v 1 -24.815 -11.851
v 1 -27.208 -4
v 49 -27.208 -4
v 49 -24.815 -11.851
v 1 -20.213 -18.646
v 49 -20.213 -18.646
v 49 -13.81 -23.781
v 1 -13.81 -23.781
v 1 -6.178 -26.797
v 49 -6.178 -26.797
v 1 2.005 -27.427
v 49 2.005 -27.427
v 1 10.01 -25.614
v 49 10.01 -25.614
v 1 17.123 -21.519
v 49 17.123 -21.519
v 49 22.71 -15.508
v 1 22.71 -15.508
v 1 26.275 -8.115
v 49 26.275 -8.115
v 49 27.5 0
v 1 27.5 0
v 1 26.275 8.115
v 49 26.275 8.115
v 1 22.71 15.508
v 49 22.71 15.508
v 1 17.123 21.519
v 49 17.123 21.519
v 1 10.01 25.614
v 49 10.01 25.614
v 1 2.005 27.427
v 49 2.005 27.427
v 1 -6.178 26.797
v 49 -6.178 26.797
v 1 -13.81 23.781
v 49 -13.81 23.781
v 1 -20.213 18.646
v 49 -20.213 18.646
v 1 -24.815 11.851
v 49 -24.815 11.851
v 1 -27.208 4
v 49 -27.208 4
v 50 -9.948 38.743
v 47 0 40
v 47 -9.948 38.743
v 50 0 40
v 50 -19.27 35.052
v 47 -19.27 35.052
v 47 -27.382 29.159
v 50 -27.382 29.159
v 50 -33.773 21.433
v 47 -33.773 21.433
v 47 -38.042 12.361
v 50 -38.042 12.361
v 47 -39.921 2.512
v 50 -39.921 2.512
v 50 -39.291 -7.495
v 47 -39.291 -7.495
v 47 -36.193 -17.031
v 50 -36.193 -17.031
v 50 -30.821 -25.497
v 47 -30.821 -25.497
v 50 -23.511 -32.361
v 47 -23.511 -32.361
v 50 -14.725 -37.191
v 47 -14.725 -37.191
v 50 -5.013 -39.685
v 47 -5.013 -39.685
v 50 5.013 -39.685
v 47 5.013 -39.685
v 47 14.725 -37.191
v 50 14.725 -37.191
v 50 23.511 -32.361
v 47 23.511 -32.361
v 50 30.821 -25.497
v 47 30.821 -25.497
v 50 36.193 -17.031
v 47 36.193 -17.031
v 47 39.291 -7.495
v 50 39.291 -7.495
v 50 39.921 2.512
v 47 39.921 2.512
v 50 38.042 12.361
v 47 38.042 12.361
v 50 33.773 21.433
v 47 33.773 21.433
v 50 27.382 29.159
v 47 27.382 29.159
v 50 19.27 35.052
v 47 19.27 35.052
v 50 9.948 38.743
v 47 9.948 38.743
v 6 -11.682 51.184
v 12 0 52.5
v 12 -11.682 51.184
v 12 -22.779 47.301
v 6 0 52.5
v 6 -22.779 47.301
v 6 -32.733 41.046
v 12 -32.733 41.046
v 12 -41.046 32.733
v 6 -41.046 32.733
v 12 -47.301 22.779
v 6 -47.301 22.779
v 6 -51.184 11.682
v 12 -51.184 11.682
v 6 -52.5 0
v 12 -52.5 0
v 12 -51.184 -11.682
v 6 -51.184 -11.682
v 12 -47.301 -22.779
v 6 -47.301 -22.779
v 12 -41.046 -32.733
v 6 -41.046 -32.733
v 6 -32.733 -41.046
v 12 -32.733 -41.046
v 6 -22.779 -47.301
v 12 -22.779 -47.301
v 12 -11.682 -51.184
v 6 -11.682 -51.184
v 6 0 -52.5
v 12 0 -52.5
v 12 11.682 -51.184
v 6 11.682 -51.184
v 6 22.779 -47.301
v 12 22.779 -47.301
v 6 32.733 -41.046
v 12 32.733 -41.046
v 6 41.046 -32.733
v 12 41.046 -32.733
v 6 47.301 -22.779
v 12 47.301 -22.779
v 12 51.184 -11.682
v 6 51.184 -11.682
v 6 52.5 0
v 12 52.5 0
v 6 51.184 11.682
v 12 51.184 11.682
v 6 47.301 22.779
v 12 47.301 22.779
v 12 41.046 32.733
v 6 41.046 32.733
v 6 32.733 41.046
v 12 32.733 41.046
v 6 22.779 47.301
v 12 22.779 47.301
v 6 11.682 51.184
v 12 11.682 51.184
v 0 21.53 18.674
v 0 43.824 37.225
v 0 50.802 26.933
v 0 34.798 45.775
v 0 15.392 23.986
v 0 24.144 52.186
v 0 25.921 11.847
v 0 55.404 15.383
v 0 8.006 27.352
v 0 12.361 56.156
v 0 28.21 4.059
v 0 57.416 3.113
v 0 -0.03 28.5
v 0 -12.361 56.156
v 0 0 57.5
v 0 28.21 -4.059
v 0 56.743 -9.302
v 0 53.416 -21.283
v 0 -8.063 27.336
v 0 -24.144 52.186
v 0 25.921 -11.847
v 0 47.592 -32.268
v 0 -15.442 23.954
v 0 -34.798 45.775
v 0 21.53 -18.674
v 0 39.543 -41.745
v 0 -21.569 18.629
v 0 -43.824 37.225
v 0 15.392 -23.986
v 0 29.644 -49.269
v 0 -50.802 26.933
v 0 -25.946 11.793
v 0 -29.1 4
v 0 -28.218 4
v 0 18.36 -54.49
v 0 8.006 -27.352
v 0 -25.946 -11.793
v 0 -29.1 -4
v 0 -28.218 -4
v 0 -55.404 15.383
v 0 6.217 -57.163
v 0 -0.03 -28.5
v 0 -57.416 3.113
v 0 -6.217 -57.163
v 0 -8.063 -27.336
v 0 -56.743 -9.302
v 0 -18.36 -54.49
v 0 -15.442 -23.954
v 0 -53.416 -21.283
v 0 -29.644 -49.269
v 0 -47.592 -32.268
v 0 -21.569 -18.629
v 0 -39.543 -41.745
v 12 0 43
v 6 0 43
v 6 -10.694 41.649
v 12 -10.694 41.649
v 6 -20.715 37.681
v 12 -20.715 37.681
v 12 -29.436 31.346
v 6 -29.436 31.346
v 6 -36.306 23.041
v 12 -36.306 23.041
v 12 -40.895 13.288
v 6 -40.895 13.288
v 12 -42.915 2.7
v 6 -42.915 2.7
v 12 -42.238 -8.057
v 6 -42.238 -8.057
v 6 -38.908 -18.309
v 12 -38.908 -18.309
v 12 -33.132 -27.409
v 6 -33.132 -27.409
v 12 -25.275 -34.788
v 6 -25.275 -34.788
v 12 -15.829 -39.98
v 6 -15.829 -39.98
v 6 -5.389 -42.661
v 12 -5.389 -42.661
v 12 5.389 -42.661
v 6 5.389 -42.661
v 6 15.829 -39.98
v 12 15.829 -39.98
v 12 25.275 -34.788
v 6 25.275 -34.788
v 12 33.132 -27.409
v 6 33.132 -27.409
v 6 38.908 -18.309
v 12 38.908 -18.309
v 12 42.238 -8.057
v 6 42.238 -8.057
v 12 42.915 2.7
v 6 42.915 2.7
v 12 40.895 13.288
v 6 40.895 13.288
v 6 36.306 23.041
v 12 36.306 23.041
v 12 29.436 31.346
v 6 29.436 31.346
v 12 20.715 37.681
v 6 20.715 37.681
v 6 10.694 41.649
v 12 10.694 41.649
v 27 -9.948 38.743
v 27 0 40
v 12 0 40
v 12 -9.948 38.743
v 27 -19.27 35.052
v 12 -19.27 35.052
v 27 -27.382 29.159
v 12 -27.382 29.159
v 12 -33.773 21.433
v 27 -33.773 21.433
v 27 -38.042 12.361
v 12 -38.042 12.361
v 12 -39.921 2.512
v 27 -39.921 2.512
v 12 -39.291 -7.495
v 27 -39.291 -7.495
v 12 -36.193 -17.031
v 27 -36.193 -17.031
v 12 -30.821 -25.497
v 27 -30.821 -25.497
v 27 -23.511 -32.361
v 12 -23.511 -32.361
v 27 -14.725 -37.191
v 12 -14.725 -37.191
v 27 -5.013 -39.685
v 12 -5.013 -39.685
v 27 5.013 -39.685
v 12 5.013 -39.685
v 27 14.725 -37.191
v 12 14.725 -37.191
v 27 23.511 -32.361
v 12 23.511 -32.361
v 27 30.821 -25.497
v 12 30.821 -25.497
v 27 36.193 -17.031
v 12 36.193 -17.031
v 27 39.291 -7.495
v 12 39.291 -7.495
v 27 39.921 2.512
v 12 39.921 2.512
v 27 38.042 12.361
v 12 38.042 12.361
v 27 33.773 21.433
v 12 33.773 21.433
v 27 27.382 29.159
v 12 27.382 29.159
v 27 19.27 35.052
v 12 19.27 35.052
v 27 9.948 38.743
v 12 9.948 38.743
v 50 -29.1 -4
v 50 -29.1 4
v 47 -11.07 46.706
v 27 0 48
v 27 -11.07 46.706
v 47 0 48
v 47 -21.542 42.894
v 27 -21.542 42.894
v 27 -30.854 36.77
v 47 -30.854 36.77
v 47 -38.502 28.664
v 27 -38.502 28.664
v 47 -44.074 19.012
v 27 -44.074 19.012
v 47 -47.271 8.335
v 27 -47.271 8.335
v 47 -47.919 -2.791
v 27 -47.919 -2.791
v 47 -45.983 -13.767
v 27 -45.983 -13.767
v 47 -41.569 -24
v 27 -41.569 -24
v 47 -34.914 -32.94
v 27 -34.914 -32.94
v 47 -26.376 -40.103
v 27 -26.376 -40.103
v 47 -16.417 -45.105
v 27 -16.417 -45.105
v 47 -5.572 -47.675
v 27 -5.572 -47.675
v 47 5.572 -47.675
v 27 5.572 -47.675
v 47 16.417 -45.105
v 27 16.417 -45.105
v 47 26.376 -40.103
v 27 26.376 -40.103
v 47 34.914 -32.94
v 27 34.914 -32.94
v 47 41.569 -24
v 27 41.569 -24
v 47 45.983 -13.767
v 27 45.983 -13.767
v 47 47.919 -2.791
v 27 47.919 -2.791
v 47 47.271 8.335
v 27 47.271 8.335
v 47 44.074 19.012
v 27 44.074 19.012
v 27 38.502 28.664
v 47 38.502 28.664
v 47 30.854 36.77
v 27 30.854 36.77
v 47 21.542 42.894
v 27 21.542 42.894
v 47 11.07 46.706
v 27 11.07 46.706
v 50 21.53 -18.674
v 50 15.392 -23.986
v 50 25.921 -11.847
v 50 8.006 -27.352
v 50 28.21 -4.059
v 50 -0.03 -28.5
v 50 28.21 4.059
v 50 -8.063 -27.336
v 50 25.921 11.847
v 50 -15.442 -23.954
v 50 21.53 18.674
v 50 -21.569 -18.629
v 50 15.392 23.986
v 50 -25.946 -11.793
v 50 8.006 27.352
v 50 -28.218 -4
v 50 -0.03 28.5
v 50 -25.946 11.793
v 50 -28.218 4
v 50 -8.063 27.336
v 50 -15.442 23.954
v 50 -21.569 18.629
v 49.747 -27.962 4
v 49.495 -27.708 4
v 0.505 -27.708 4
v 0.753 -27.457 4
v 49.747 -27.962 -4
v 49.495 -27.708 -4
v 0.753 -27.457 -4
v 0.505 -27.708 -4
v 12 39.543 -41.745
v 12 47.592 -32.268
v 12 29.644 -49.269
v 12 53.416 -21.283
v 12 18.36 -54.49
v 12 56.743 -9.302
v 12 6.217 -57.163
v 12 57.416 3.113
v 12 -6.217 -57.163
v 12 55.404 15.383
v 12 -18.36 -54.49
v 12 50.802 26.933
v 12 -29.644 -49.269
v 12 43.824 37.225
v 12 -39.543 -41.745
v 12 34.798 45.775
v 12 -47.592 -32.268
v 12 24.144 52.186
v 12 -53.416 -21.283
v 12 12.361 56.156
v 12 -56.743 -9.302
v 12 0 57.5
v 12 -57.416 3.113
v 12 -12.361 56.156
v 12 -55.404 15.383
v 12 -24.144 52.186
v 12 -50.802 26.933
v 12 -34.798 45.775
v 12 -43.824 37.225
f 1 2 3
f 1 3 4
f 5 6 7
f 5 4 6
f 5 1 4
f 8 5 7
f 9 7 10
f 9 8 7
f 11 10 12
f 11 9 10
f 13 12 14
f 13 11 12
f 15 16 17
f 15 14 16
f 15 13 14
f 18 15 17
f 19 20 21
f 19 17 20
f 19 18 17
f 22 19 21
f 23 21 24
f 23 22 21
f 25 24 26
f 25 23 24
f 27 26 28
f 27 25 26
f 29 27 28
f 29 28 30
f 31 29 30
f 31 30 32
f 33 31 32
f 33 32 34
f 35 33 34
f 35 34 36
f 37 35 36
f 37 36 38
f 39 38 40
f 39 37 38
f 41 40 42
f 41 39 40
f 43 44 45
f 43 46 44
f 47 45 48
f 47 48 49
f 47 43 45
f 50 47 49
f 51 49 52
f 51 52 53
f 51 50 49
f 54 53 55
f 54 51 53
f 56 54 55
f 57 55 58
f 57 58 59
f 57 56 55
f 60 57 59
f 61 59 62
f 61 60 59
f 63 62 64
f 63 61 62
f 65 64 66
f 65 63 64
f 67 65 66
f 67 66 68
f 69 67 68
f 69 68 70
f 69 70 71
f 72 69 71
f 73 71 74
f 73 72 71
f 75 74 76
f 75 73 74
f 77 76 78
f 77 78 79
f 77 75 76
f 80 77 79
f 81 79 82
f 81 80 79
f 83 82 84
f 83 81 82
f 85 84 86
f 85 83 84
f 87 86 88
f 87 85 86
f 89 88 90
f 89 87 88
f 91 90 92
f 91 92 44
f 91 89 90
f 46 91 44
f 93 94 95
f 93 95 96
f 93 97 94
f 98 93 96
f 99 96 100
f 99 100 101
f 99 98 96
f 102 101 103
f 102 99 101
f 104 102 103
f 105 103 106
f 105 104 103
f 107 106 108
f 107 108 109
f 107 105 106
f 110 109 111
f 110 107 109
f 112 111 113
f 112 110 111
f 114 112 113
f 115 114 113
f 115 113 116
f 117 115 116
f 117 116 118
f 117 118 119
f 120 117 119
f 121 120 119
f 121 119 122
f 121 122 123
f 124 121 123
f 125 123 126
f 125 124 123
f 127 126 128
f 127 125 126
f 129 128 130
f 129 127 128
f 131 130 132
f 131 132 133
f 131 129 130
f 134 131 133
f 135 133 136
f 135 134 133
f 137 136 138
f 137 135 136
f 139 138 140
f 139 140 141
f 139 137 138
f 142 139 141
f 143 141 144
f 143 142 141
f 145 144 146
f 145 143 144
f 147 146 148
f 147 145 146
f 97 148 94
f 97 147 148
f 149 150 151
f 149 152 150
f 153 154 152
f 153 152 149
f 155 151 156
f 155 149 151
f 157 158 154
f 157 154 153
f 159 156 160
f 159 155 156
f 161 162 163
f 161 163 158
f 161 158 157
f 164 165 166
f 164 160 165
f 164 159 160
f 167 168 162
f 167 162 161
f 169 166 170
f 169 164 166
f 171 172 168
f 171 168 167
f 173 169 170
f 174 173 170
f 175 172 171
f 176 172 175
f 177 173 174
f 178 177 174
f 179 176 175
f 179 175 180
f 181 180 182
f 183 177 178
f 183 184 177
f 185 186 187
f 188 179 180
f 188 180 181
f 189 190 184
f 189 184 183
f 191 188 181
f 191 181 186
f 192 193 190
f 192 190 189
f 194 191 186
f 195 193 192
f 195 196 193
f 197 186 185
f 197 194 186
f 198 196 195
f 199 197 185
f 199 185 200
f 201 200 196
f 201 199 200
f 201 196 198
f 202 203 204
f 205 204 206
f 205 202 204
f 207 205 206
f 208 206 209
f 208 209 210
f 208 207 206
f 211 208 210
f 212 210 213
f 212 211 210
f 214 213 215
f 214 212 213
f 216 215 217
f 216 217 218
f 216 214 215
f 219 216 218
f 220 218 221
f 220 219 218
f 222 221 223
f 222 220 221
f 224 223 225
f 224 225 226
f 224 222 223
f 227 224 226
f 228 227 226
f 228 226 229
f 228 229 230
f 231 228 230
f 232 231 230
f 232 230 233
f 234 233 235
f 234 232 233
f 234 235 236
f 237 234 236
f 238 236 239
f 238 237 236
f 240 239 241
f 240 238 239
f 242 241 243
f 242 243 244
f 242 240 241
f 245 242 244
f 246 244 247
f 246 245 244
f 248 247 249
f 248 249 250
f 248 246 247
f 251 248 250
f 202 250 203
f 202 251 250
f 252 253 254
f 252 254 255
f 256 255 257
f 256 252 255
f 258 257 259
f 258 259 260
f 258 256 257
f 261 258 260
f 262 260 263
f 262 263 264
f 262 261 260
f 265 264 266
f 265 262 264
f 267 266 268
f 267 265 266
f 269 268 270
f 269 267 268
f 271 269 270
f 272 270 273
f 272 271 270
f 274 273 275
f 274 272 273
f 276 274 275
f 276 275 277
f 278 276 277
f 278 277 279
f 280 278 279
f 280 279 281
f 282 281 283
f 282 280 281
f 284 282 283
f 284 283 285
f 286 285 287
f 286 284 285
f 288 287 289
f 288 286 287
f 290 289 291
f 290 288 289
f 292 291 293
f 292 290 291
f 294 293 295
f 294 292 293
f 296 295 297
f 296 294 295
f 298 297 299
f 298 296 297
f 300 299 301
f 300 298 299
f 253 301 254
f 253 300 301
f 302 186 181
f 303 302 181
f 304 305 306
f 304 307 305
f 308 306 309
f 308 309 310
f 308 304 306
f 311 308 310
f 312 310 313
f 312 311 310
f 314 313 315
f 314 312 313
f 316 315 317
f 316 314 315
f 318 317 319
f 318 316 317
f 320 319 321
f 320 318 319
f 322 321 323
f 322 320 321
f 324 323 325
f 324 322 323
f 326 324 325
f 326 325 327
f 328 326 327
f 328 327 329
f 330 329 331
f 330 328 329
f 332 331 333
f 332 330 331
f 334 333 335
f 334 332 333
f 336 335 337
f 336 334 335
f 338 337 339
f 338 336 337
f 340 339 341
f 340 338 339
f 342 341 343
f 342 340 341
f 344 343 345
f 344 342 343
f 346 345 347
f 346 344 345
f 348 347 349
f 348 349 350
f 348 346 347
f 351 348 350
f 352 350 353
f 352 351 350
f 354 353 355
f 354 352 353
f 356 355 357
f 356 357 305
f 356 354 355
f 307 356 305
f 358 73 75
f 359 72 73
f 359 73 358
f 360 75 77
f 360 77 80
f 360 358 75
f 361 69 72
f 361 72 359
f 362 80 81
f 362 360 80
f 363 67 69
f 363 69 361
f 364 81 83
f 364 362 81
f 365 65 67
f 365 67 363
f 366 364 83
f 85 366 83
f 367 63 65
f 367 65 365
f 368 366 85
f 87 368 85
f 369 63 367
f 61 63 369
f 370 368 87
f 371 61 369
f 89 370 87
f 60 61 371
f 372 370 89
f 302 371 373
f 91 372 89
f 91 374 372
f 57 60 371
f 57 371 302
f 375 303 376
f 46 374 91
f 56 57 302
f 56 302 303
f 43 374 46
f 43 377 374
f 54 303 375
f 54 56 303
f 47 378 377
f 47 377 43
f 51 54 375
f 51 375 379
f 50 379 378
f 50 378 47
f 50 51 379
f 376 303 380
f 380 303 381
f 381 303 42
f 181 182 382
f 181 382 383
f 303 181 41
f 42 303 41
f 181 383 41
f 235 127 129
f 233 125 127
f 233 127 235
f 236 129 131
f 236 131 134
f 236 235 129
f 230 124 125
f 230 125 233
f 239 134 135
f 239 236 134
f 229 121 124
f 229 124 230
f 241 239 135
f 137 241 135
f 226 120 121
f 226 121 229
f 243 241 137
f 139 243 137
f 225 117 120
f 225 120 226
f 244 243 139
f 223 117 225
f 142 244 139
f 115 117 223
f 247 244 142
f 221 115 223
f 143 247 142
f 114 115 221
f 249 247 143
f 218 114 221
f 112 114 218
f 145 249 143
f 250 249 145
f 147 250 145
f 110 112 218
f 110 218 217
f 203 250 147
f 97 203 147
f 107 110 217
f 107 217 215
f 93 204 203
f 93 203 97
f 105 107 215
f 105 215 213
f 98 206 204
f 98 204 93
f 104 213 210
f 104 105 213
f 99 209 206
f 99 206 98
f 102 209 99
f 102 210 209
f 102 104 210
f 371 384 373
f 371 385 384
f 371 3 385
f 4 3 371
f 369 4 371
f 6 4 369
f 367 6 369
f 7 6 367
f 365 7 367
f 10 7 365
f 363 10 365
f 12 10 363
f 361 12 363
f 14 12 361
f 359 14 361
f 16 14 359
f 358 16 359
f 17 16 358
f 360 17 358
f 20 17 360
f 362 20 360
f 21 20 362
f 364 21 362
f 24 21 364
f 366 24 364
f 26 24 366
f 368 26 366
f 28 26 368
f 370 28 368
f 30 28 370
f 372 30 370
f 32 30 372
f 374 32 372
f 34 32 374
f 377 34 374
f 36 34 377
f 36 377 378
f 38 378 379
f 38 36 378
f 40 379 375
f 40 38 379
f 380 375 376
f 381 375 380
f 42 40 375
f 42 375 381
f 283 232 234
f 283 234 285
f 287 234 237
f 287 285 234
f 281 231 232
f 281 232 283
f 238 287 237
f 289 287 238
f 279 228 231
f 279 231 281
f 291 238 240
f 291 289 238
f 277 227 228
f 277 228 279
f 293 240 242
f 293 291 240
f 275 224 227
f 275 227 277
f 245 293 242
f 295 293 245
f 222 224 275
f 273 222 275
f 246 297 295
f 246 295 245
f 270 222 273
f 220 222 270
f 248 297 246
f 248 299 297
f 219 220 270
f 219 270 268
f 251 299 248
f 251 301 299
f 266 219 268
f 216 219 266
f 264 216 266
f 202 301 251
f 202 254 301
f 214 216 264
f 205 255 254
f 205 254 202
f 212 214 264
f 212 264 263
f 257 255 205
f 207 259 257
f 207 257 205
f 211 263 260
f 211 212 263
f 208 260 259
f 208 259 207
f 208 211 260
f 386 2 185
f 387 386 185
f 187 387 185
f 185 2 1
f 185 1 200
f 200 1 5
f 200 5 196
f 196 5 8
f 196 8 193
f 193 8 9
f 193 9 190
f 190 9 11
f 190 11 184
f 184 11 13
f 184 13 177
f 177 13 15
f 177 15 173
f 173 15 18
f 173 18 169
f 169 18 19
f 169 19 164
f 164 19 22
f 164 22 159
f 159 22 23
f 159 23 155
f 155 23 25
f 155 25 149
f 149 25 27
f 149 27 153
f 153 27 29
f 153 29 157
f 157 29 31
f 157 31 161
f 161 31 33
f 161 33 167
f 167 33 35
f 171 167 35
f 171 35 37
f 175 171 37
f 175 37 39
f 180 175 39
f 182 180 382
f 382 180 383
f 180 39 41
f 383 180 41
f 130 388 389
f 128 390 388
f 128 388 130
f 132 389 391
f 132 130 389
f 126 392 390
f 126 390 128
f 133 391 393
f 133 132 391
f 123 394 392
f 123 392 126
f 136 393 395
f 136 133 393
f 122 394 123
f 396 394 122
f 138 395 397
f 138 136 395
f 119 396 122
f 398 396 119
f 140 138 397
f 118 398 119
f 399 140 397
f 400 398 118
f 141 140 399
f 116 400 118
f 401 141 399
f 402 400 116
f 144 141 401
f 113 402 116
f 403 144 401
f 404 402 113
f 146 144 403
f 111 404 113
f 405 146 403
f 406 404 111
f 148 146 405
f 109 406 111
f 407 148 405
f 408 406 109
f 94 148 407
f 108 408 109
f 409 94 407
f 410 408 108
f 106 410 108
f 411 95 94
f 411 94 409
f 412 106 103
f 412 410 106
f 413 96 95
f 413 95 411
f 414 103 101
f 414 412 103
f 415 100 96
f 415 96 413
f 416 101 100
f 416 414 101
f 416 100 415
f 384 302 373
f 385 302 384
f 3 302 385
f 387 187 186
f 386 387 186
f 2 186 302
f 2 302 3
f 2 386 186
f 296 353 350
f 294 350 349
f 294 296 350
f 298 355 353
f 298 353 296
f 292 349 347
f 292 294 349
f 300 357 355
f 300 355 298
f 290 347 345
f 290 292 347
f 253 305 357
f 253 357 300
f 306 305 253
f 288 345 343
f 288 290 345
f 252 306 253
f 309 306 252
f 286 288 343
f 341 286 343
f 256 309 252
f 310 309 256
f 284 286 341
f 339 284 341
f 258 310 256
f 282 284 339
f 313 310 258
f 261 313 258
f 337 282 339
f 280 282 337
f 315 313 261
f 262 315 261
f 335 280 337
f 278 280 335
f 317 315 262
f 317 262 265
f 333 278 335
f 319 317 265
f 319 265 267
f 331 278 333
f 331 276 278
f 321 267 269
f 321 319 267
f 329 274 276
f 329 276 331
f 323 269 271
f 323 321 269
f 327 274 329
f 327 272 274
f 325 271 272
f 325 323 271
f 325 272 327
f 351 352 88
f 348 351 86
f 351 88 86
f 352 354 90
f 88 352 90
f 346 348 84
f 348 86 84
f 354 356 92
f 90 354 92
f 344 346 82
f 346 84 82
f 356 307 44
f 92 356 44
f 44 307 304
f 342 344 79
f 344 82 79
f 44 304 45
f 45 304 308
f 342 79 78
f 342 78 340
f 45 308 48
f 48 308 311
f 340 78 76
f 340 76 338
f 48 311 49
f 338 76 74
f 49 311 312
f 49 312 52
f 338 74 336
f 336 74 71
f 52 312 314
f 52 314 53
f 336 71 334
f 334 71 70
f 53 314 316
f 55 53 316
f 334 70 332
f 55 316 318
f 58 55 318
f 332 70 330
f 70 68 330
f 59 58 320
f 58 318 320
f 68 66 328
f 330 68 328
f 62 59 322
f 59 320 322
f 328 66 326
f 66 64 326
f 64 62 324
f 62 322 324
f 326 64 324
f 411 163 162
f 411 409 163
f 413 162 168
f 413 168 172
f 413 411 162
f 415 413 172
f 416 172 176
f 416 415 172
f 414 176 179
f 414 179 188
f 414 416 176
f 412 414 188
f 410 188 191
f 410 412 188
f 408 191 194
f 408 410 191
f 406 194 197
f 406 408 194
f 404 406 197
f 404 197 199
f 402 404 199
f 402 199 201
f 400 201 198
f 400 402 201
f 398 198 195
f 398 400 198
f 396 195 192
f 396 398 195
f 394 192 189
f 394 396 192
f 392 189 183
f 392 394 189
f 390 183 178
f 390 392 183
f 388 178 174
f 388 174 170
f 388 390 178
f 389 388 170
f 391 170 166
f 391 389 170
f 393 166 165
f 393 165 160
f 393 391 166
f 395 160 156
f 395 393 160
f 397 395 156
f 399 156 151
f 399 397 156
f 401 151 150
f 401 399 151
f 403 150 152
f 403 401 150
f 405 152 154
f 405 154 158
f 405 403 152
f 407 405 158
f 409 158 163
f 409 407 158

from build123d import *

# Parameters (mm, degrees)
CHAMFER_1_SIZE      = 1
SKETCH_3_W          = 20
SKETCH_3_H          = 8.011692653
SKETCH_4_W          = 8
SKETCH_4_H          = 6.987786138
CUT_EXTRUDE_1_DEPTH = 96.45941546


with BuildPart() as part:
    # 草图1 → 旋转1 (revolve)
    with BuildSketch(Plane.XY, mode=Mode.PRIVATE) as revolve_1_sk:
        Polygon((0, 27.5), (0, 57.5), (12, 57.5), (12, 52.5), (6, 52.5), (6, 43), (12, 43), (12, 40), (50, 40), (50, 27.5), align=None)
    revolve(revolve_1_sk.sketch.rotate(Axis((0, 0, 0), (1, 0, 0)), 90), axis=Axis((0, 0, 0), (1, 0, 0)))

    # 倒角1
    chamfer_1_edges = [part.edges().sort_by_distance(p)[0] for p in [
        (0, 0, -27.5),
        (50, 0, -27.5),
    ]]
    chamfer(chamfer_1_edges, length=CHAMFER_1_SIZE)

    # 草图3 → 旋转2 (revolve)
    with BuildSketch(Plane.XY, mode=Mode.PRIVATE) as revolve_2_sk:
        with Locations((37, 43.994153674)):
            Rectangle(SKETCH_3_W, SKETCH_3_H)
    revolve(revolve_2_sk.sketch.rotate(Axis((27, 0, 0), (1, 0, 0)), 90), axis=Axis((27, 0, 0), (1, 0, 0)))

    # 草图4 → 切除-拉伸1 (cut, through all)
    with BuildSketch(Plane.ZY):
        with Locations((0, -25.606106931)):
            Rectangle(SKETCH_4_W, SKETCH_4_H)
    extrude(amount=-CUT_EXTRUDE_1_DEPTH, mode=Mode.SUBTRACT)


solid = part.part
